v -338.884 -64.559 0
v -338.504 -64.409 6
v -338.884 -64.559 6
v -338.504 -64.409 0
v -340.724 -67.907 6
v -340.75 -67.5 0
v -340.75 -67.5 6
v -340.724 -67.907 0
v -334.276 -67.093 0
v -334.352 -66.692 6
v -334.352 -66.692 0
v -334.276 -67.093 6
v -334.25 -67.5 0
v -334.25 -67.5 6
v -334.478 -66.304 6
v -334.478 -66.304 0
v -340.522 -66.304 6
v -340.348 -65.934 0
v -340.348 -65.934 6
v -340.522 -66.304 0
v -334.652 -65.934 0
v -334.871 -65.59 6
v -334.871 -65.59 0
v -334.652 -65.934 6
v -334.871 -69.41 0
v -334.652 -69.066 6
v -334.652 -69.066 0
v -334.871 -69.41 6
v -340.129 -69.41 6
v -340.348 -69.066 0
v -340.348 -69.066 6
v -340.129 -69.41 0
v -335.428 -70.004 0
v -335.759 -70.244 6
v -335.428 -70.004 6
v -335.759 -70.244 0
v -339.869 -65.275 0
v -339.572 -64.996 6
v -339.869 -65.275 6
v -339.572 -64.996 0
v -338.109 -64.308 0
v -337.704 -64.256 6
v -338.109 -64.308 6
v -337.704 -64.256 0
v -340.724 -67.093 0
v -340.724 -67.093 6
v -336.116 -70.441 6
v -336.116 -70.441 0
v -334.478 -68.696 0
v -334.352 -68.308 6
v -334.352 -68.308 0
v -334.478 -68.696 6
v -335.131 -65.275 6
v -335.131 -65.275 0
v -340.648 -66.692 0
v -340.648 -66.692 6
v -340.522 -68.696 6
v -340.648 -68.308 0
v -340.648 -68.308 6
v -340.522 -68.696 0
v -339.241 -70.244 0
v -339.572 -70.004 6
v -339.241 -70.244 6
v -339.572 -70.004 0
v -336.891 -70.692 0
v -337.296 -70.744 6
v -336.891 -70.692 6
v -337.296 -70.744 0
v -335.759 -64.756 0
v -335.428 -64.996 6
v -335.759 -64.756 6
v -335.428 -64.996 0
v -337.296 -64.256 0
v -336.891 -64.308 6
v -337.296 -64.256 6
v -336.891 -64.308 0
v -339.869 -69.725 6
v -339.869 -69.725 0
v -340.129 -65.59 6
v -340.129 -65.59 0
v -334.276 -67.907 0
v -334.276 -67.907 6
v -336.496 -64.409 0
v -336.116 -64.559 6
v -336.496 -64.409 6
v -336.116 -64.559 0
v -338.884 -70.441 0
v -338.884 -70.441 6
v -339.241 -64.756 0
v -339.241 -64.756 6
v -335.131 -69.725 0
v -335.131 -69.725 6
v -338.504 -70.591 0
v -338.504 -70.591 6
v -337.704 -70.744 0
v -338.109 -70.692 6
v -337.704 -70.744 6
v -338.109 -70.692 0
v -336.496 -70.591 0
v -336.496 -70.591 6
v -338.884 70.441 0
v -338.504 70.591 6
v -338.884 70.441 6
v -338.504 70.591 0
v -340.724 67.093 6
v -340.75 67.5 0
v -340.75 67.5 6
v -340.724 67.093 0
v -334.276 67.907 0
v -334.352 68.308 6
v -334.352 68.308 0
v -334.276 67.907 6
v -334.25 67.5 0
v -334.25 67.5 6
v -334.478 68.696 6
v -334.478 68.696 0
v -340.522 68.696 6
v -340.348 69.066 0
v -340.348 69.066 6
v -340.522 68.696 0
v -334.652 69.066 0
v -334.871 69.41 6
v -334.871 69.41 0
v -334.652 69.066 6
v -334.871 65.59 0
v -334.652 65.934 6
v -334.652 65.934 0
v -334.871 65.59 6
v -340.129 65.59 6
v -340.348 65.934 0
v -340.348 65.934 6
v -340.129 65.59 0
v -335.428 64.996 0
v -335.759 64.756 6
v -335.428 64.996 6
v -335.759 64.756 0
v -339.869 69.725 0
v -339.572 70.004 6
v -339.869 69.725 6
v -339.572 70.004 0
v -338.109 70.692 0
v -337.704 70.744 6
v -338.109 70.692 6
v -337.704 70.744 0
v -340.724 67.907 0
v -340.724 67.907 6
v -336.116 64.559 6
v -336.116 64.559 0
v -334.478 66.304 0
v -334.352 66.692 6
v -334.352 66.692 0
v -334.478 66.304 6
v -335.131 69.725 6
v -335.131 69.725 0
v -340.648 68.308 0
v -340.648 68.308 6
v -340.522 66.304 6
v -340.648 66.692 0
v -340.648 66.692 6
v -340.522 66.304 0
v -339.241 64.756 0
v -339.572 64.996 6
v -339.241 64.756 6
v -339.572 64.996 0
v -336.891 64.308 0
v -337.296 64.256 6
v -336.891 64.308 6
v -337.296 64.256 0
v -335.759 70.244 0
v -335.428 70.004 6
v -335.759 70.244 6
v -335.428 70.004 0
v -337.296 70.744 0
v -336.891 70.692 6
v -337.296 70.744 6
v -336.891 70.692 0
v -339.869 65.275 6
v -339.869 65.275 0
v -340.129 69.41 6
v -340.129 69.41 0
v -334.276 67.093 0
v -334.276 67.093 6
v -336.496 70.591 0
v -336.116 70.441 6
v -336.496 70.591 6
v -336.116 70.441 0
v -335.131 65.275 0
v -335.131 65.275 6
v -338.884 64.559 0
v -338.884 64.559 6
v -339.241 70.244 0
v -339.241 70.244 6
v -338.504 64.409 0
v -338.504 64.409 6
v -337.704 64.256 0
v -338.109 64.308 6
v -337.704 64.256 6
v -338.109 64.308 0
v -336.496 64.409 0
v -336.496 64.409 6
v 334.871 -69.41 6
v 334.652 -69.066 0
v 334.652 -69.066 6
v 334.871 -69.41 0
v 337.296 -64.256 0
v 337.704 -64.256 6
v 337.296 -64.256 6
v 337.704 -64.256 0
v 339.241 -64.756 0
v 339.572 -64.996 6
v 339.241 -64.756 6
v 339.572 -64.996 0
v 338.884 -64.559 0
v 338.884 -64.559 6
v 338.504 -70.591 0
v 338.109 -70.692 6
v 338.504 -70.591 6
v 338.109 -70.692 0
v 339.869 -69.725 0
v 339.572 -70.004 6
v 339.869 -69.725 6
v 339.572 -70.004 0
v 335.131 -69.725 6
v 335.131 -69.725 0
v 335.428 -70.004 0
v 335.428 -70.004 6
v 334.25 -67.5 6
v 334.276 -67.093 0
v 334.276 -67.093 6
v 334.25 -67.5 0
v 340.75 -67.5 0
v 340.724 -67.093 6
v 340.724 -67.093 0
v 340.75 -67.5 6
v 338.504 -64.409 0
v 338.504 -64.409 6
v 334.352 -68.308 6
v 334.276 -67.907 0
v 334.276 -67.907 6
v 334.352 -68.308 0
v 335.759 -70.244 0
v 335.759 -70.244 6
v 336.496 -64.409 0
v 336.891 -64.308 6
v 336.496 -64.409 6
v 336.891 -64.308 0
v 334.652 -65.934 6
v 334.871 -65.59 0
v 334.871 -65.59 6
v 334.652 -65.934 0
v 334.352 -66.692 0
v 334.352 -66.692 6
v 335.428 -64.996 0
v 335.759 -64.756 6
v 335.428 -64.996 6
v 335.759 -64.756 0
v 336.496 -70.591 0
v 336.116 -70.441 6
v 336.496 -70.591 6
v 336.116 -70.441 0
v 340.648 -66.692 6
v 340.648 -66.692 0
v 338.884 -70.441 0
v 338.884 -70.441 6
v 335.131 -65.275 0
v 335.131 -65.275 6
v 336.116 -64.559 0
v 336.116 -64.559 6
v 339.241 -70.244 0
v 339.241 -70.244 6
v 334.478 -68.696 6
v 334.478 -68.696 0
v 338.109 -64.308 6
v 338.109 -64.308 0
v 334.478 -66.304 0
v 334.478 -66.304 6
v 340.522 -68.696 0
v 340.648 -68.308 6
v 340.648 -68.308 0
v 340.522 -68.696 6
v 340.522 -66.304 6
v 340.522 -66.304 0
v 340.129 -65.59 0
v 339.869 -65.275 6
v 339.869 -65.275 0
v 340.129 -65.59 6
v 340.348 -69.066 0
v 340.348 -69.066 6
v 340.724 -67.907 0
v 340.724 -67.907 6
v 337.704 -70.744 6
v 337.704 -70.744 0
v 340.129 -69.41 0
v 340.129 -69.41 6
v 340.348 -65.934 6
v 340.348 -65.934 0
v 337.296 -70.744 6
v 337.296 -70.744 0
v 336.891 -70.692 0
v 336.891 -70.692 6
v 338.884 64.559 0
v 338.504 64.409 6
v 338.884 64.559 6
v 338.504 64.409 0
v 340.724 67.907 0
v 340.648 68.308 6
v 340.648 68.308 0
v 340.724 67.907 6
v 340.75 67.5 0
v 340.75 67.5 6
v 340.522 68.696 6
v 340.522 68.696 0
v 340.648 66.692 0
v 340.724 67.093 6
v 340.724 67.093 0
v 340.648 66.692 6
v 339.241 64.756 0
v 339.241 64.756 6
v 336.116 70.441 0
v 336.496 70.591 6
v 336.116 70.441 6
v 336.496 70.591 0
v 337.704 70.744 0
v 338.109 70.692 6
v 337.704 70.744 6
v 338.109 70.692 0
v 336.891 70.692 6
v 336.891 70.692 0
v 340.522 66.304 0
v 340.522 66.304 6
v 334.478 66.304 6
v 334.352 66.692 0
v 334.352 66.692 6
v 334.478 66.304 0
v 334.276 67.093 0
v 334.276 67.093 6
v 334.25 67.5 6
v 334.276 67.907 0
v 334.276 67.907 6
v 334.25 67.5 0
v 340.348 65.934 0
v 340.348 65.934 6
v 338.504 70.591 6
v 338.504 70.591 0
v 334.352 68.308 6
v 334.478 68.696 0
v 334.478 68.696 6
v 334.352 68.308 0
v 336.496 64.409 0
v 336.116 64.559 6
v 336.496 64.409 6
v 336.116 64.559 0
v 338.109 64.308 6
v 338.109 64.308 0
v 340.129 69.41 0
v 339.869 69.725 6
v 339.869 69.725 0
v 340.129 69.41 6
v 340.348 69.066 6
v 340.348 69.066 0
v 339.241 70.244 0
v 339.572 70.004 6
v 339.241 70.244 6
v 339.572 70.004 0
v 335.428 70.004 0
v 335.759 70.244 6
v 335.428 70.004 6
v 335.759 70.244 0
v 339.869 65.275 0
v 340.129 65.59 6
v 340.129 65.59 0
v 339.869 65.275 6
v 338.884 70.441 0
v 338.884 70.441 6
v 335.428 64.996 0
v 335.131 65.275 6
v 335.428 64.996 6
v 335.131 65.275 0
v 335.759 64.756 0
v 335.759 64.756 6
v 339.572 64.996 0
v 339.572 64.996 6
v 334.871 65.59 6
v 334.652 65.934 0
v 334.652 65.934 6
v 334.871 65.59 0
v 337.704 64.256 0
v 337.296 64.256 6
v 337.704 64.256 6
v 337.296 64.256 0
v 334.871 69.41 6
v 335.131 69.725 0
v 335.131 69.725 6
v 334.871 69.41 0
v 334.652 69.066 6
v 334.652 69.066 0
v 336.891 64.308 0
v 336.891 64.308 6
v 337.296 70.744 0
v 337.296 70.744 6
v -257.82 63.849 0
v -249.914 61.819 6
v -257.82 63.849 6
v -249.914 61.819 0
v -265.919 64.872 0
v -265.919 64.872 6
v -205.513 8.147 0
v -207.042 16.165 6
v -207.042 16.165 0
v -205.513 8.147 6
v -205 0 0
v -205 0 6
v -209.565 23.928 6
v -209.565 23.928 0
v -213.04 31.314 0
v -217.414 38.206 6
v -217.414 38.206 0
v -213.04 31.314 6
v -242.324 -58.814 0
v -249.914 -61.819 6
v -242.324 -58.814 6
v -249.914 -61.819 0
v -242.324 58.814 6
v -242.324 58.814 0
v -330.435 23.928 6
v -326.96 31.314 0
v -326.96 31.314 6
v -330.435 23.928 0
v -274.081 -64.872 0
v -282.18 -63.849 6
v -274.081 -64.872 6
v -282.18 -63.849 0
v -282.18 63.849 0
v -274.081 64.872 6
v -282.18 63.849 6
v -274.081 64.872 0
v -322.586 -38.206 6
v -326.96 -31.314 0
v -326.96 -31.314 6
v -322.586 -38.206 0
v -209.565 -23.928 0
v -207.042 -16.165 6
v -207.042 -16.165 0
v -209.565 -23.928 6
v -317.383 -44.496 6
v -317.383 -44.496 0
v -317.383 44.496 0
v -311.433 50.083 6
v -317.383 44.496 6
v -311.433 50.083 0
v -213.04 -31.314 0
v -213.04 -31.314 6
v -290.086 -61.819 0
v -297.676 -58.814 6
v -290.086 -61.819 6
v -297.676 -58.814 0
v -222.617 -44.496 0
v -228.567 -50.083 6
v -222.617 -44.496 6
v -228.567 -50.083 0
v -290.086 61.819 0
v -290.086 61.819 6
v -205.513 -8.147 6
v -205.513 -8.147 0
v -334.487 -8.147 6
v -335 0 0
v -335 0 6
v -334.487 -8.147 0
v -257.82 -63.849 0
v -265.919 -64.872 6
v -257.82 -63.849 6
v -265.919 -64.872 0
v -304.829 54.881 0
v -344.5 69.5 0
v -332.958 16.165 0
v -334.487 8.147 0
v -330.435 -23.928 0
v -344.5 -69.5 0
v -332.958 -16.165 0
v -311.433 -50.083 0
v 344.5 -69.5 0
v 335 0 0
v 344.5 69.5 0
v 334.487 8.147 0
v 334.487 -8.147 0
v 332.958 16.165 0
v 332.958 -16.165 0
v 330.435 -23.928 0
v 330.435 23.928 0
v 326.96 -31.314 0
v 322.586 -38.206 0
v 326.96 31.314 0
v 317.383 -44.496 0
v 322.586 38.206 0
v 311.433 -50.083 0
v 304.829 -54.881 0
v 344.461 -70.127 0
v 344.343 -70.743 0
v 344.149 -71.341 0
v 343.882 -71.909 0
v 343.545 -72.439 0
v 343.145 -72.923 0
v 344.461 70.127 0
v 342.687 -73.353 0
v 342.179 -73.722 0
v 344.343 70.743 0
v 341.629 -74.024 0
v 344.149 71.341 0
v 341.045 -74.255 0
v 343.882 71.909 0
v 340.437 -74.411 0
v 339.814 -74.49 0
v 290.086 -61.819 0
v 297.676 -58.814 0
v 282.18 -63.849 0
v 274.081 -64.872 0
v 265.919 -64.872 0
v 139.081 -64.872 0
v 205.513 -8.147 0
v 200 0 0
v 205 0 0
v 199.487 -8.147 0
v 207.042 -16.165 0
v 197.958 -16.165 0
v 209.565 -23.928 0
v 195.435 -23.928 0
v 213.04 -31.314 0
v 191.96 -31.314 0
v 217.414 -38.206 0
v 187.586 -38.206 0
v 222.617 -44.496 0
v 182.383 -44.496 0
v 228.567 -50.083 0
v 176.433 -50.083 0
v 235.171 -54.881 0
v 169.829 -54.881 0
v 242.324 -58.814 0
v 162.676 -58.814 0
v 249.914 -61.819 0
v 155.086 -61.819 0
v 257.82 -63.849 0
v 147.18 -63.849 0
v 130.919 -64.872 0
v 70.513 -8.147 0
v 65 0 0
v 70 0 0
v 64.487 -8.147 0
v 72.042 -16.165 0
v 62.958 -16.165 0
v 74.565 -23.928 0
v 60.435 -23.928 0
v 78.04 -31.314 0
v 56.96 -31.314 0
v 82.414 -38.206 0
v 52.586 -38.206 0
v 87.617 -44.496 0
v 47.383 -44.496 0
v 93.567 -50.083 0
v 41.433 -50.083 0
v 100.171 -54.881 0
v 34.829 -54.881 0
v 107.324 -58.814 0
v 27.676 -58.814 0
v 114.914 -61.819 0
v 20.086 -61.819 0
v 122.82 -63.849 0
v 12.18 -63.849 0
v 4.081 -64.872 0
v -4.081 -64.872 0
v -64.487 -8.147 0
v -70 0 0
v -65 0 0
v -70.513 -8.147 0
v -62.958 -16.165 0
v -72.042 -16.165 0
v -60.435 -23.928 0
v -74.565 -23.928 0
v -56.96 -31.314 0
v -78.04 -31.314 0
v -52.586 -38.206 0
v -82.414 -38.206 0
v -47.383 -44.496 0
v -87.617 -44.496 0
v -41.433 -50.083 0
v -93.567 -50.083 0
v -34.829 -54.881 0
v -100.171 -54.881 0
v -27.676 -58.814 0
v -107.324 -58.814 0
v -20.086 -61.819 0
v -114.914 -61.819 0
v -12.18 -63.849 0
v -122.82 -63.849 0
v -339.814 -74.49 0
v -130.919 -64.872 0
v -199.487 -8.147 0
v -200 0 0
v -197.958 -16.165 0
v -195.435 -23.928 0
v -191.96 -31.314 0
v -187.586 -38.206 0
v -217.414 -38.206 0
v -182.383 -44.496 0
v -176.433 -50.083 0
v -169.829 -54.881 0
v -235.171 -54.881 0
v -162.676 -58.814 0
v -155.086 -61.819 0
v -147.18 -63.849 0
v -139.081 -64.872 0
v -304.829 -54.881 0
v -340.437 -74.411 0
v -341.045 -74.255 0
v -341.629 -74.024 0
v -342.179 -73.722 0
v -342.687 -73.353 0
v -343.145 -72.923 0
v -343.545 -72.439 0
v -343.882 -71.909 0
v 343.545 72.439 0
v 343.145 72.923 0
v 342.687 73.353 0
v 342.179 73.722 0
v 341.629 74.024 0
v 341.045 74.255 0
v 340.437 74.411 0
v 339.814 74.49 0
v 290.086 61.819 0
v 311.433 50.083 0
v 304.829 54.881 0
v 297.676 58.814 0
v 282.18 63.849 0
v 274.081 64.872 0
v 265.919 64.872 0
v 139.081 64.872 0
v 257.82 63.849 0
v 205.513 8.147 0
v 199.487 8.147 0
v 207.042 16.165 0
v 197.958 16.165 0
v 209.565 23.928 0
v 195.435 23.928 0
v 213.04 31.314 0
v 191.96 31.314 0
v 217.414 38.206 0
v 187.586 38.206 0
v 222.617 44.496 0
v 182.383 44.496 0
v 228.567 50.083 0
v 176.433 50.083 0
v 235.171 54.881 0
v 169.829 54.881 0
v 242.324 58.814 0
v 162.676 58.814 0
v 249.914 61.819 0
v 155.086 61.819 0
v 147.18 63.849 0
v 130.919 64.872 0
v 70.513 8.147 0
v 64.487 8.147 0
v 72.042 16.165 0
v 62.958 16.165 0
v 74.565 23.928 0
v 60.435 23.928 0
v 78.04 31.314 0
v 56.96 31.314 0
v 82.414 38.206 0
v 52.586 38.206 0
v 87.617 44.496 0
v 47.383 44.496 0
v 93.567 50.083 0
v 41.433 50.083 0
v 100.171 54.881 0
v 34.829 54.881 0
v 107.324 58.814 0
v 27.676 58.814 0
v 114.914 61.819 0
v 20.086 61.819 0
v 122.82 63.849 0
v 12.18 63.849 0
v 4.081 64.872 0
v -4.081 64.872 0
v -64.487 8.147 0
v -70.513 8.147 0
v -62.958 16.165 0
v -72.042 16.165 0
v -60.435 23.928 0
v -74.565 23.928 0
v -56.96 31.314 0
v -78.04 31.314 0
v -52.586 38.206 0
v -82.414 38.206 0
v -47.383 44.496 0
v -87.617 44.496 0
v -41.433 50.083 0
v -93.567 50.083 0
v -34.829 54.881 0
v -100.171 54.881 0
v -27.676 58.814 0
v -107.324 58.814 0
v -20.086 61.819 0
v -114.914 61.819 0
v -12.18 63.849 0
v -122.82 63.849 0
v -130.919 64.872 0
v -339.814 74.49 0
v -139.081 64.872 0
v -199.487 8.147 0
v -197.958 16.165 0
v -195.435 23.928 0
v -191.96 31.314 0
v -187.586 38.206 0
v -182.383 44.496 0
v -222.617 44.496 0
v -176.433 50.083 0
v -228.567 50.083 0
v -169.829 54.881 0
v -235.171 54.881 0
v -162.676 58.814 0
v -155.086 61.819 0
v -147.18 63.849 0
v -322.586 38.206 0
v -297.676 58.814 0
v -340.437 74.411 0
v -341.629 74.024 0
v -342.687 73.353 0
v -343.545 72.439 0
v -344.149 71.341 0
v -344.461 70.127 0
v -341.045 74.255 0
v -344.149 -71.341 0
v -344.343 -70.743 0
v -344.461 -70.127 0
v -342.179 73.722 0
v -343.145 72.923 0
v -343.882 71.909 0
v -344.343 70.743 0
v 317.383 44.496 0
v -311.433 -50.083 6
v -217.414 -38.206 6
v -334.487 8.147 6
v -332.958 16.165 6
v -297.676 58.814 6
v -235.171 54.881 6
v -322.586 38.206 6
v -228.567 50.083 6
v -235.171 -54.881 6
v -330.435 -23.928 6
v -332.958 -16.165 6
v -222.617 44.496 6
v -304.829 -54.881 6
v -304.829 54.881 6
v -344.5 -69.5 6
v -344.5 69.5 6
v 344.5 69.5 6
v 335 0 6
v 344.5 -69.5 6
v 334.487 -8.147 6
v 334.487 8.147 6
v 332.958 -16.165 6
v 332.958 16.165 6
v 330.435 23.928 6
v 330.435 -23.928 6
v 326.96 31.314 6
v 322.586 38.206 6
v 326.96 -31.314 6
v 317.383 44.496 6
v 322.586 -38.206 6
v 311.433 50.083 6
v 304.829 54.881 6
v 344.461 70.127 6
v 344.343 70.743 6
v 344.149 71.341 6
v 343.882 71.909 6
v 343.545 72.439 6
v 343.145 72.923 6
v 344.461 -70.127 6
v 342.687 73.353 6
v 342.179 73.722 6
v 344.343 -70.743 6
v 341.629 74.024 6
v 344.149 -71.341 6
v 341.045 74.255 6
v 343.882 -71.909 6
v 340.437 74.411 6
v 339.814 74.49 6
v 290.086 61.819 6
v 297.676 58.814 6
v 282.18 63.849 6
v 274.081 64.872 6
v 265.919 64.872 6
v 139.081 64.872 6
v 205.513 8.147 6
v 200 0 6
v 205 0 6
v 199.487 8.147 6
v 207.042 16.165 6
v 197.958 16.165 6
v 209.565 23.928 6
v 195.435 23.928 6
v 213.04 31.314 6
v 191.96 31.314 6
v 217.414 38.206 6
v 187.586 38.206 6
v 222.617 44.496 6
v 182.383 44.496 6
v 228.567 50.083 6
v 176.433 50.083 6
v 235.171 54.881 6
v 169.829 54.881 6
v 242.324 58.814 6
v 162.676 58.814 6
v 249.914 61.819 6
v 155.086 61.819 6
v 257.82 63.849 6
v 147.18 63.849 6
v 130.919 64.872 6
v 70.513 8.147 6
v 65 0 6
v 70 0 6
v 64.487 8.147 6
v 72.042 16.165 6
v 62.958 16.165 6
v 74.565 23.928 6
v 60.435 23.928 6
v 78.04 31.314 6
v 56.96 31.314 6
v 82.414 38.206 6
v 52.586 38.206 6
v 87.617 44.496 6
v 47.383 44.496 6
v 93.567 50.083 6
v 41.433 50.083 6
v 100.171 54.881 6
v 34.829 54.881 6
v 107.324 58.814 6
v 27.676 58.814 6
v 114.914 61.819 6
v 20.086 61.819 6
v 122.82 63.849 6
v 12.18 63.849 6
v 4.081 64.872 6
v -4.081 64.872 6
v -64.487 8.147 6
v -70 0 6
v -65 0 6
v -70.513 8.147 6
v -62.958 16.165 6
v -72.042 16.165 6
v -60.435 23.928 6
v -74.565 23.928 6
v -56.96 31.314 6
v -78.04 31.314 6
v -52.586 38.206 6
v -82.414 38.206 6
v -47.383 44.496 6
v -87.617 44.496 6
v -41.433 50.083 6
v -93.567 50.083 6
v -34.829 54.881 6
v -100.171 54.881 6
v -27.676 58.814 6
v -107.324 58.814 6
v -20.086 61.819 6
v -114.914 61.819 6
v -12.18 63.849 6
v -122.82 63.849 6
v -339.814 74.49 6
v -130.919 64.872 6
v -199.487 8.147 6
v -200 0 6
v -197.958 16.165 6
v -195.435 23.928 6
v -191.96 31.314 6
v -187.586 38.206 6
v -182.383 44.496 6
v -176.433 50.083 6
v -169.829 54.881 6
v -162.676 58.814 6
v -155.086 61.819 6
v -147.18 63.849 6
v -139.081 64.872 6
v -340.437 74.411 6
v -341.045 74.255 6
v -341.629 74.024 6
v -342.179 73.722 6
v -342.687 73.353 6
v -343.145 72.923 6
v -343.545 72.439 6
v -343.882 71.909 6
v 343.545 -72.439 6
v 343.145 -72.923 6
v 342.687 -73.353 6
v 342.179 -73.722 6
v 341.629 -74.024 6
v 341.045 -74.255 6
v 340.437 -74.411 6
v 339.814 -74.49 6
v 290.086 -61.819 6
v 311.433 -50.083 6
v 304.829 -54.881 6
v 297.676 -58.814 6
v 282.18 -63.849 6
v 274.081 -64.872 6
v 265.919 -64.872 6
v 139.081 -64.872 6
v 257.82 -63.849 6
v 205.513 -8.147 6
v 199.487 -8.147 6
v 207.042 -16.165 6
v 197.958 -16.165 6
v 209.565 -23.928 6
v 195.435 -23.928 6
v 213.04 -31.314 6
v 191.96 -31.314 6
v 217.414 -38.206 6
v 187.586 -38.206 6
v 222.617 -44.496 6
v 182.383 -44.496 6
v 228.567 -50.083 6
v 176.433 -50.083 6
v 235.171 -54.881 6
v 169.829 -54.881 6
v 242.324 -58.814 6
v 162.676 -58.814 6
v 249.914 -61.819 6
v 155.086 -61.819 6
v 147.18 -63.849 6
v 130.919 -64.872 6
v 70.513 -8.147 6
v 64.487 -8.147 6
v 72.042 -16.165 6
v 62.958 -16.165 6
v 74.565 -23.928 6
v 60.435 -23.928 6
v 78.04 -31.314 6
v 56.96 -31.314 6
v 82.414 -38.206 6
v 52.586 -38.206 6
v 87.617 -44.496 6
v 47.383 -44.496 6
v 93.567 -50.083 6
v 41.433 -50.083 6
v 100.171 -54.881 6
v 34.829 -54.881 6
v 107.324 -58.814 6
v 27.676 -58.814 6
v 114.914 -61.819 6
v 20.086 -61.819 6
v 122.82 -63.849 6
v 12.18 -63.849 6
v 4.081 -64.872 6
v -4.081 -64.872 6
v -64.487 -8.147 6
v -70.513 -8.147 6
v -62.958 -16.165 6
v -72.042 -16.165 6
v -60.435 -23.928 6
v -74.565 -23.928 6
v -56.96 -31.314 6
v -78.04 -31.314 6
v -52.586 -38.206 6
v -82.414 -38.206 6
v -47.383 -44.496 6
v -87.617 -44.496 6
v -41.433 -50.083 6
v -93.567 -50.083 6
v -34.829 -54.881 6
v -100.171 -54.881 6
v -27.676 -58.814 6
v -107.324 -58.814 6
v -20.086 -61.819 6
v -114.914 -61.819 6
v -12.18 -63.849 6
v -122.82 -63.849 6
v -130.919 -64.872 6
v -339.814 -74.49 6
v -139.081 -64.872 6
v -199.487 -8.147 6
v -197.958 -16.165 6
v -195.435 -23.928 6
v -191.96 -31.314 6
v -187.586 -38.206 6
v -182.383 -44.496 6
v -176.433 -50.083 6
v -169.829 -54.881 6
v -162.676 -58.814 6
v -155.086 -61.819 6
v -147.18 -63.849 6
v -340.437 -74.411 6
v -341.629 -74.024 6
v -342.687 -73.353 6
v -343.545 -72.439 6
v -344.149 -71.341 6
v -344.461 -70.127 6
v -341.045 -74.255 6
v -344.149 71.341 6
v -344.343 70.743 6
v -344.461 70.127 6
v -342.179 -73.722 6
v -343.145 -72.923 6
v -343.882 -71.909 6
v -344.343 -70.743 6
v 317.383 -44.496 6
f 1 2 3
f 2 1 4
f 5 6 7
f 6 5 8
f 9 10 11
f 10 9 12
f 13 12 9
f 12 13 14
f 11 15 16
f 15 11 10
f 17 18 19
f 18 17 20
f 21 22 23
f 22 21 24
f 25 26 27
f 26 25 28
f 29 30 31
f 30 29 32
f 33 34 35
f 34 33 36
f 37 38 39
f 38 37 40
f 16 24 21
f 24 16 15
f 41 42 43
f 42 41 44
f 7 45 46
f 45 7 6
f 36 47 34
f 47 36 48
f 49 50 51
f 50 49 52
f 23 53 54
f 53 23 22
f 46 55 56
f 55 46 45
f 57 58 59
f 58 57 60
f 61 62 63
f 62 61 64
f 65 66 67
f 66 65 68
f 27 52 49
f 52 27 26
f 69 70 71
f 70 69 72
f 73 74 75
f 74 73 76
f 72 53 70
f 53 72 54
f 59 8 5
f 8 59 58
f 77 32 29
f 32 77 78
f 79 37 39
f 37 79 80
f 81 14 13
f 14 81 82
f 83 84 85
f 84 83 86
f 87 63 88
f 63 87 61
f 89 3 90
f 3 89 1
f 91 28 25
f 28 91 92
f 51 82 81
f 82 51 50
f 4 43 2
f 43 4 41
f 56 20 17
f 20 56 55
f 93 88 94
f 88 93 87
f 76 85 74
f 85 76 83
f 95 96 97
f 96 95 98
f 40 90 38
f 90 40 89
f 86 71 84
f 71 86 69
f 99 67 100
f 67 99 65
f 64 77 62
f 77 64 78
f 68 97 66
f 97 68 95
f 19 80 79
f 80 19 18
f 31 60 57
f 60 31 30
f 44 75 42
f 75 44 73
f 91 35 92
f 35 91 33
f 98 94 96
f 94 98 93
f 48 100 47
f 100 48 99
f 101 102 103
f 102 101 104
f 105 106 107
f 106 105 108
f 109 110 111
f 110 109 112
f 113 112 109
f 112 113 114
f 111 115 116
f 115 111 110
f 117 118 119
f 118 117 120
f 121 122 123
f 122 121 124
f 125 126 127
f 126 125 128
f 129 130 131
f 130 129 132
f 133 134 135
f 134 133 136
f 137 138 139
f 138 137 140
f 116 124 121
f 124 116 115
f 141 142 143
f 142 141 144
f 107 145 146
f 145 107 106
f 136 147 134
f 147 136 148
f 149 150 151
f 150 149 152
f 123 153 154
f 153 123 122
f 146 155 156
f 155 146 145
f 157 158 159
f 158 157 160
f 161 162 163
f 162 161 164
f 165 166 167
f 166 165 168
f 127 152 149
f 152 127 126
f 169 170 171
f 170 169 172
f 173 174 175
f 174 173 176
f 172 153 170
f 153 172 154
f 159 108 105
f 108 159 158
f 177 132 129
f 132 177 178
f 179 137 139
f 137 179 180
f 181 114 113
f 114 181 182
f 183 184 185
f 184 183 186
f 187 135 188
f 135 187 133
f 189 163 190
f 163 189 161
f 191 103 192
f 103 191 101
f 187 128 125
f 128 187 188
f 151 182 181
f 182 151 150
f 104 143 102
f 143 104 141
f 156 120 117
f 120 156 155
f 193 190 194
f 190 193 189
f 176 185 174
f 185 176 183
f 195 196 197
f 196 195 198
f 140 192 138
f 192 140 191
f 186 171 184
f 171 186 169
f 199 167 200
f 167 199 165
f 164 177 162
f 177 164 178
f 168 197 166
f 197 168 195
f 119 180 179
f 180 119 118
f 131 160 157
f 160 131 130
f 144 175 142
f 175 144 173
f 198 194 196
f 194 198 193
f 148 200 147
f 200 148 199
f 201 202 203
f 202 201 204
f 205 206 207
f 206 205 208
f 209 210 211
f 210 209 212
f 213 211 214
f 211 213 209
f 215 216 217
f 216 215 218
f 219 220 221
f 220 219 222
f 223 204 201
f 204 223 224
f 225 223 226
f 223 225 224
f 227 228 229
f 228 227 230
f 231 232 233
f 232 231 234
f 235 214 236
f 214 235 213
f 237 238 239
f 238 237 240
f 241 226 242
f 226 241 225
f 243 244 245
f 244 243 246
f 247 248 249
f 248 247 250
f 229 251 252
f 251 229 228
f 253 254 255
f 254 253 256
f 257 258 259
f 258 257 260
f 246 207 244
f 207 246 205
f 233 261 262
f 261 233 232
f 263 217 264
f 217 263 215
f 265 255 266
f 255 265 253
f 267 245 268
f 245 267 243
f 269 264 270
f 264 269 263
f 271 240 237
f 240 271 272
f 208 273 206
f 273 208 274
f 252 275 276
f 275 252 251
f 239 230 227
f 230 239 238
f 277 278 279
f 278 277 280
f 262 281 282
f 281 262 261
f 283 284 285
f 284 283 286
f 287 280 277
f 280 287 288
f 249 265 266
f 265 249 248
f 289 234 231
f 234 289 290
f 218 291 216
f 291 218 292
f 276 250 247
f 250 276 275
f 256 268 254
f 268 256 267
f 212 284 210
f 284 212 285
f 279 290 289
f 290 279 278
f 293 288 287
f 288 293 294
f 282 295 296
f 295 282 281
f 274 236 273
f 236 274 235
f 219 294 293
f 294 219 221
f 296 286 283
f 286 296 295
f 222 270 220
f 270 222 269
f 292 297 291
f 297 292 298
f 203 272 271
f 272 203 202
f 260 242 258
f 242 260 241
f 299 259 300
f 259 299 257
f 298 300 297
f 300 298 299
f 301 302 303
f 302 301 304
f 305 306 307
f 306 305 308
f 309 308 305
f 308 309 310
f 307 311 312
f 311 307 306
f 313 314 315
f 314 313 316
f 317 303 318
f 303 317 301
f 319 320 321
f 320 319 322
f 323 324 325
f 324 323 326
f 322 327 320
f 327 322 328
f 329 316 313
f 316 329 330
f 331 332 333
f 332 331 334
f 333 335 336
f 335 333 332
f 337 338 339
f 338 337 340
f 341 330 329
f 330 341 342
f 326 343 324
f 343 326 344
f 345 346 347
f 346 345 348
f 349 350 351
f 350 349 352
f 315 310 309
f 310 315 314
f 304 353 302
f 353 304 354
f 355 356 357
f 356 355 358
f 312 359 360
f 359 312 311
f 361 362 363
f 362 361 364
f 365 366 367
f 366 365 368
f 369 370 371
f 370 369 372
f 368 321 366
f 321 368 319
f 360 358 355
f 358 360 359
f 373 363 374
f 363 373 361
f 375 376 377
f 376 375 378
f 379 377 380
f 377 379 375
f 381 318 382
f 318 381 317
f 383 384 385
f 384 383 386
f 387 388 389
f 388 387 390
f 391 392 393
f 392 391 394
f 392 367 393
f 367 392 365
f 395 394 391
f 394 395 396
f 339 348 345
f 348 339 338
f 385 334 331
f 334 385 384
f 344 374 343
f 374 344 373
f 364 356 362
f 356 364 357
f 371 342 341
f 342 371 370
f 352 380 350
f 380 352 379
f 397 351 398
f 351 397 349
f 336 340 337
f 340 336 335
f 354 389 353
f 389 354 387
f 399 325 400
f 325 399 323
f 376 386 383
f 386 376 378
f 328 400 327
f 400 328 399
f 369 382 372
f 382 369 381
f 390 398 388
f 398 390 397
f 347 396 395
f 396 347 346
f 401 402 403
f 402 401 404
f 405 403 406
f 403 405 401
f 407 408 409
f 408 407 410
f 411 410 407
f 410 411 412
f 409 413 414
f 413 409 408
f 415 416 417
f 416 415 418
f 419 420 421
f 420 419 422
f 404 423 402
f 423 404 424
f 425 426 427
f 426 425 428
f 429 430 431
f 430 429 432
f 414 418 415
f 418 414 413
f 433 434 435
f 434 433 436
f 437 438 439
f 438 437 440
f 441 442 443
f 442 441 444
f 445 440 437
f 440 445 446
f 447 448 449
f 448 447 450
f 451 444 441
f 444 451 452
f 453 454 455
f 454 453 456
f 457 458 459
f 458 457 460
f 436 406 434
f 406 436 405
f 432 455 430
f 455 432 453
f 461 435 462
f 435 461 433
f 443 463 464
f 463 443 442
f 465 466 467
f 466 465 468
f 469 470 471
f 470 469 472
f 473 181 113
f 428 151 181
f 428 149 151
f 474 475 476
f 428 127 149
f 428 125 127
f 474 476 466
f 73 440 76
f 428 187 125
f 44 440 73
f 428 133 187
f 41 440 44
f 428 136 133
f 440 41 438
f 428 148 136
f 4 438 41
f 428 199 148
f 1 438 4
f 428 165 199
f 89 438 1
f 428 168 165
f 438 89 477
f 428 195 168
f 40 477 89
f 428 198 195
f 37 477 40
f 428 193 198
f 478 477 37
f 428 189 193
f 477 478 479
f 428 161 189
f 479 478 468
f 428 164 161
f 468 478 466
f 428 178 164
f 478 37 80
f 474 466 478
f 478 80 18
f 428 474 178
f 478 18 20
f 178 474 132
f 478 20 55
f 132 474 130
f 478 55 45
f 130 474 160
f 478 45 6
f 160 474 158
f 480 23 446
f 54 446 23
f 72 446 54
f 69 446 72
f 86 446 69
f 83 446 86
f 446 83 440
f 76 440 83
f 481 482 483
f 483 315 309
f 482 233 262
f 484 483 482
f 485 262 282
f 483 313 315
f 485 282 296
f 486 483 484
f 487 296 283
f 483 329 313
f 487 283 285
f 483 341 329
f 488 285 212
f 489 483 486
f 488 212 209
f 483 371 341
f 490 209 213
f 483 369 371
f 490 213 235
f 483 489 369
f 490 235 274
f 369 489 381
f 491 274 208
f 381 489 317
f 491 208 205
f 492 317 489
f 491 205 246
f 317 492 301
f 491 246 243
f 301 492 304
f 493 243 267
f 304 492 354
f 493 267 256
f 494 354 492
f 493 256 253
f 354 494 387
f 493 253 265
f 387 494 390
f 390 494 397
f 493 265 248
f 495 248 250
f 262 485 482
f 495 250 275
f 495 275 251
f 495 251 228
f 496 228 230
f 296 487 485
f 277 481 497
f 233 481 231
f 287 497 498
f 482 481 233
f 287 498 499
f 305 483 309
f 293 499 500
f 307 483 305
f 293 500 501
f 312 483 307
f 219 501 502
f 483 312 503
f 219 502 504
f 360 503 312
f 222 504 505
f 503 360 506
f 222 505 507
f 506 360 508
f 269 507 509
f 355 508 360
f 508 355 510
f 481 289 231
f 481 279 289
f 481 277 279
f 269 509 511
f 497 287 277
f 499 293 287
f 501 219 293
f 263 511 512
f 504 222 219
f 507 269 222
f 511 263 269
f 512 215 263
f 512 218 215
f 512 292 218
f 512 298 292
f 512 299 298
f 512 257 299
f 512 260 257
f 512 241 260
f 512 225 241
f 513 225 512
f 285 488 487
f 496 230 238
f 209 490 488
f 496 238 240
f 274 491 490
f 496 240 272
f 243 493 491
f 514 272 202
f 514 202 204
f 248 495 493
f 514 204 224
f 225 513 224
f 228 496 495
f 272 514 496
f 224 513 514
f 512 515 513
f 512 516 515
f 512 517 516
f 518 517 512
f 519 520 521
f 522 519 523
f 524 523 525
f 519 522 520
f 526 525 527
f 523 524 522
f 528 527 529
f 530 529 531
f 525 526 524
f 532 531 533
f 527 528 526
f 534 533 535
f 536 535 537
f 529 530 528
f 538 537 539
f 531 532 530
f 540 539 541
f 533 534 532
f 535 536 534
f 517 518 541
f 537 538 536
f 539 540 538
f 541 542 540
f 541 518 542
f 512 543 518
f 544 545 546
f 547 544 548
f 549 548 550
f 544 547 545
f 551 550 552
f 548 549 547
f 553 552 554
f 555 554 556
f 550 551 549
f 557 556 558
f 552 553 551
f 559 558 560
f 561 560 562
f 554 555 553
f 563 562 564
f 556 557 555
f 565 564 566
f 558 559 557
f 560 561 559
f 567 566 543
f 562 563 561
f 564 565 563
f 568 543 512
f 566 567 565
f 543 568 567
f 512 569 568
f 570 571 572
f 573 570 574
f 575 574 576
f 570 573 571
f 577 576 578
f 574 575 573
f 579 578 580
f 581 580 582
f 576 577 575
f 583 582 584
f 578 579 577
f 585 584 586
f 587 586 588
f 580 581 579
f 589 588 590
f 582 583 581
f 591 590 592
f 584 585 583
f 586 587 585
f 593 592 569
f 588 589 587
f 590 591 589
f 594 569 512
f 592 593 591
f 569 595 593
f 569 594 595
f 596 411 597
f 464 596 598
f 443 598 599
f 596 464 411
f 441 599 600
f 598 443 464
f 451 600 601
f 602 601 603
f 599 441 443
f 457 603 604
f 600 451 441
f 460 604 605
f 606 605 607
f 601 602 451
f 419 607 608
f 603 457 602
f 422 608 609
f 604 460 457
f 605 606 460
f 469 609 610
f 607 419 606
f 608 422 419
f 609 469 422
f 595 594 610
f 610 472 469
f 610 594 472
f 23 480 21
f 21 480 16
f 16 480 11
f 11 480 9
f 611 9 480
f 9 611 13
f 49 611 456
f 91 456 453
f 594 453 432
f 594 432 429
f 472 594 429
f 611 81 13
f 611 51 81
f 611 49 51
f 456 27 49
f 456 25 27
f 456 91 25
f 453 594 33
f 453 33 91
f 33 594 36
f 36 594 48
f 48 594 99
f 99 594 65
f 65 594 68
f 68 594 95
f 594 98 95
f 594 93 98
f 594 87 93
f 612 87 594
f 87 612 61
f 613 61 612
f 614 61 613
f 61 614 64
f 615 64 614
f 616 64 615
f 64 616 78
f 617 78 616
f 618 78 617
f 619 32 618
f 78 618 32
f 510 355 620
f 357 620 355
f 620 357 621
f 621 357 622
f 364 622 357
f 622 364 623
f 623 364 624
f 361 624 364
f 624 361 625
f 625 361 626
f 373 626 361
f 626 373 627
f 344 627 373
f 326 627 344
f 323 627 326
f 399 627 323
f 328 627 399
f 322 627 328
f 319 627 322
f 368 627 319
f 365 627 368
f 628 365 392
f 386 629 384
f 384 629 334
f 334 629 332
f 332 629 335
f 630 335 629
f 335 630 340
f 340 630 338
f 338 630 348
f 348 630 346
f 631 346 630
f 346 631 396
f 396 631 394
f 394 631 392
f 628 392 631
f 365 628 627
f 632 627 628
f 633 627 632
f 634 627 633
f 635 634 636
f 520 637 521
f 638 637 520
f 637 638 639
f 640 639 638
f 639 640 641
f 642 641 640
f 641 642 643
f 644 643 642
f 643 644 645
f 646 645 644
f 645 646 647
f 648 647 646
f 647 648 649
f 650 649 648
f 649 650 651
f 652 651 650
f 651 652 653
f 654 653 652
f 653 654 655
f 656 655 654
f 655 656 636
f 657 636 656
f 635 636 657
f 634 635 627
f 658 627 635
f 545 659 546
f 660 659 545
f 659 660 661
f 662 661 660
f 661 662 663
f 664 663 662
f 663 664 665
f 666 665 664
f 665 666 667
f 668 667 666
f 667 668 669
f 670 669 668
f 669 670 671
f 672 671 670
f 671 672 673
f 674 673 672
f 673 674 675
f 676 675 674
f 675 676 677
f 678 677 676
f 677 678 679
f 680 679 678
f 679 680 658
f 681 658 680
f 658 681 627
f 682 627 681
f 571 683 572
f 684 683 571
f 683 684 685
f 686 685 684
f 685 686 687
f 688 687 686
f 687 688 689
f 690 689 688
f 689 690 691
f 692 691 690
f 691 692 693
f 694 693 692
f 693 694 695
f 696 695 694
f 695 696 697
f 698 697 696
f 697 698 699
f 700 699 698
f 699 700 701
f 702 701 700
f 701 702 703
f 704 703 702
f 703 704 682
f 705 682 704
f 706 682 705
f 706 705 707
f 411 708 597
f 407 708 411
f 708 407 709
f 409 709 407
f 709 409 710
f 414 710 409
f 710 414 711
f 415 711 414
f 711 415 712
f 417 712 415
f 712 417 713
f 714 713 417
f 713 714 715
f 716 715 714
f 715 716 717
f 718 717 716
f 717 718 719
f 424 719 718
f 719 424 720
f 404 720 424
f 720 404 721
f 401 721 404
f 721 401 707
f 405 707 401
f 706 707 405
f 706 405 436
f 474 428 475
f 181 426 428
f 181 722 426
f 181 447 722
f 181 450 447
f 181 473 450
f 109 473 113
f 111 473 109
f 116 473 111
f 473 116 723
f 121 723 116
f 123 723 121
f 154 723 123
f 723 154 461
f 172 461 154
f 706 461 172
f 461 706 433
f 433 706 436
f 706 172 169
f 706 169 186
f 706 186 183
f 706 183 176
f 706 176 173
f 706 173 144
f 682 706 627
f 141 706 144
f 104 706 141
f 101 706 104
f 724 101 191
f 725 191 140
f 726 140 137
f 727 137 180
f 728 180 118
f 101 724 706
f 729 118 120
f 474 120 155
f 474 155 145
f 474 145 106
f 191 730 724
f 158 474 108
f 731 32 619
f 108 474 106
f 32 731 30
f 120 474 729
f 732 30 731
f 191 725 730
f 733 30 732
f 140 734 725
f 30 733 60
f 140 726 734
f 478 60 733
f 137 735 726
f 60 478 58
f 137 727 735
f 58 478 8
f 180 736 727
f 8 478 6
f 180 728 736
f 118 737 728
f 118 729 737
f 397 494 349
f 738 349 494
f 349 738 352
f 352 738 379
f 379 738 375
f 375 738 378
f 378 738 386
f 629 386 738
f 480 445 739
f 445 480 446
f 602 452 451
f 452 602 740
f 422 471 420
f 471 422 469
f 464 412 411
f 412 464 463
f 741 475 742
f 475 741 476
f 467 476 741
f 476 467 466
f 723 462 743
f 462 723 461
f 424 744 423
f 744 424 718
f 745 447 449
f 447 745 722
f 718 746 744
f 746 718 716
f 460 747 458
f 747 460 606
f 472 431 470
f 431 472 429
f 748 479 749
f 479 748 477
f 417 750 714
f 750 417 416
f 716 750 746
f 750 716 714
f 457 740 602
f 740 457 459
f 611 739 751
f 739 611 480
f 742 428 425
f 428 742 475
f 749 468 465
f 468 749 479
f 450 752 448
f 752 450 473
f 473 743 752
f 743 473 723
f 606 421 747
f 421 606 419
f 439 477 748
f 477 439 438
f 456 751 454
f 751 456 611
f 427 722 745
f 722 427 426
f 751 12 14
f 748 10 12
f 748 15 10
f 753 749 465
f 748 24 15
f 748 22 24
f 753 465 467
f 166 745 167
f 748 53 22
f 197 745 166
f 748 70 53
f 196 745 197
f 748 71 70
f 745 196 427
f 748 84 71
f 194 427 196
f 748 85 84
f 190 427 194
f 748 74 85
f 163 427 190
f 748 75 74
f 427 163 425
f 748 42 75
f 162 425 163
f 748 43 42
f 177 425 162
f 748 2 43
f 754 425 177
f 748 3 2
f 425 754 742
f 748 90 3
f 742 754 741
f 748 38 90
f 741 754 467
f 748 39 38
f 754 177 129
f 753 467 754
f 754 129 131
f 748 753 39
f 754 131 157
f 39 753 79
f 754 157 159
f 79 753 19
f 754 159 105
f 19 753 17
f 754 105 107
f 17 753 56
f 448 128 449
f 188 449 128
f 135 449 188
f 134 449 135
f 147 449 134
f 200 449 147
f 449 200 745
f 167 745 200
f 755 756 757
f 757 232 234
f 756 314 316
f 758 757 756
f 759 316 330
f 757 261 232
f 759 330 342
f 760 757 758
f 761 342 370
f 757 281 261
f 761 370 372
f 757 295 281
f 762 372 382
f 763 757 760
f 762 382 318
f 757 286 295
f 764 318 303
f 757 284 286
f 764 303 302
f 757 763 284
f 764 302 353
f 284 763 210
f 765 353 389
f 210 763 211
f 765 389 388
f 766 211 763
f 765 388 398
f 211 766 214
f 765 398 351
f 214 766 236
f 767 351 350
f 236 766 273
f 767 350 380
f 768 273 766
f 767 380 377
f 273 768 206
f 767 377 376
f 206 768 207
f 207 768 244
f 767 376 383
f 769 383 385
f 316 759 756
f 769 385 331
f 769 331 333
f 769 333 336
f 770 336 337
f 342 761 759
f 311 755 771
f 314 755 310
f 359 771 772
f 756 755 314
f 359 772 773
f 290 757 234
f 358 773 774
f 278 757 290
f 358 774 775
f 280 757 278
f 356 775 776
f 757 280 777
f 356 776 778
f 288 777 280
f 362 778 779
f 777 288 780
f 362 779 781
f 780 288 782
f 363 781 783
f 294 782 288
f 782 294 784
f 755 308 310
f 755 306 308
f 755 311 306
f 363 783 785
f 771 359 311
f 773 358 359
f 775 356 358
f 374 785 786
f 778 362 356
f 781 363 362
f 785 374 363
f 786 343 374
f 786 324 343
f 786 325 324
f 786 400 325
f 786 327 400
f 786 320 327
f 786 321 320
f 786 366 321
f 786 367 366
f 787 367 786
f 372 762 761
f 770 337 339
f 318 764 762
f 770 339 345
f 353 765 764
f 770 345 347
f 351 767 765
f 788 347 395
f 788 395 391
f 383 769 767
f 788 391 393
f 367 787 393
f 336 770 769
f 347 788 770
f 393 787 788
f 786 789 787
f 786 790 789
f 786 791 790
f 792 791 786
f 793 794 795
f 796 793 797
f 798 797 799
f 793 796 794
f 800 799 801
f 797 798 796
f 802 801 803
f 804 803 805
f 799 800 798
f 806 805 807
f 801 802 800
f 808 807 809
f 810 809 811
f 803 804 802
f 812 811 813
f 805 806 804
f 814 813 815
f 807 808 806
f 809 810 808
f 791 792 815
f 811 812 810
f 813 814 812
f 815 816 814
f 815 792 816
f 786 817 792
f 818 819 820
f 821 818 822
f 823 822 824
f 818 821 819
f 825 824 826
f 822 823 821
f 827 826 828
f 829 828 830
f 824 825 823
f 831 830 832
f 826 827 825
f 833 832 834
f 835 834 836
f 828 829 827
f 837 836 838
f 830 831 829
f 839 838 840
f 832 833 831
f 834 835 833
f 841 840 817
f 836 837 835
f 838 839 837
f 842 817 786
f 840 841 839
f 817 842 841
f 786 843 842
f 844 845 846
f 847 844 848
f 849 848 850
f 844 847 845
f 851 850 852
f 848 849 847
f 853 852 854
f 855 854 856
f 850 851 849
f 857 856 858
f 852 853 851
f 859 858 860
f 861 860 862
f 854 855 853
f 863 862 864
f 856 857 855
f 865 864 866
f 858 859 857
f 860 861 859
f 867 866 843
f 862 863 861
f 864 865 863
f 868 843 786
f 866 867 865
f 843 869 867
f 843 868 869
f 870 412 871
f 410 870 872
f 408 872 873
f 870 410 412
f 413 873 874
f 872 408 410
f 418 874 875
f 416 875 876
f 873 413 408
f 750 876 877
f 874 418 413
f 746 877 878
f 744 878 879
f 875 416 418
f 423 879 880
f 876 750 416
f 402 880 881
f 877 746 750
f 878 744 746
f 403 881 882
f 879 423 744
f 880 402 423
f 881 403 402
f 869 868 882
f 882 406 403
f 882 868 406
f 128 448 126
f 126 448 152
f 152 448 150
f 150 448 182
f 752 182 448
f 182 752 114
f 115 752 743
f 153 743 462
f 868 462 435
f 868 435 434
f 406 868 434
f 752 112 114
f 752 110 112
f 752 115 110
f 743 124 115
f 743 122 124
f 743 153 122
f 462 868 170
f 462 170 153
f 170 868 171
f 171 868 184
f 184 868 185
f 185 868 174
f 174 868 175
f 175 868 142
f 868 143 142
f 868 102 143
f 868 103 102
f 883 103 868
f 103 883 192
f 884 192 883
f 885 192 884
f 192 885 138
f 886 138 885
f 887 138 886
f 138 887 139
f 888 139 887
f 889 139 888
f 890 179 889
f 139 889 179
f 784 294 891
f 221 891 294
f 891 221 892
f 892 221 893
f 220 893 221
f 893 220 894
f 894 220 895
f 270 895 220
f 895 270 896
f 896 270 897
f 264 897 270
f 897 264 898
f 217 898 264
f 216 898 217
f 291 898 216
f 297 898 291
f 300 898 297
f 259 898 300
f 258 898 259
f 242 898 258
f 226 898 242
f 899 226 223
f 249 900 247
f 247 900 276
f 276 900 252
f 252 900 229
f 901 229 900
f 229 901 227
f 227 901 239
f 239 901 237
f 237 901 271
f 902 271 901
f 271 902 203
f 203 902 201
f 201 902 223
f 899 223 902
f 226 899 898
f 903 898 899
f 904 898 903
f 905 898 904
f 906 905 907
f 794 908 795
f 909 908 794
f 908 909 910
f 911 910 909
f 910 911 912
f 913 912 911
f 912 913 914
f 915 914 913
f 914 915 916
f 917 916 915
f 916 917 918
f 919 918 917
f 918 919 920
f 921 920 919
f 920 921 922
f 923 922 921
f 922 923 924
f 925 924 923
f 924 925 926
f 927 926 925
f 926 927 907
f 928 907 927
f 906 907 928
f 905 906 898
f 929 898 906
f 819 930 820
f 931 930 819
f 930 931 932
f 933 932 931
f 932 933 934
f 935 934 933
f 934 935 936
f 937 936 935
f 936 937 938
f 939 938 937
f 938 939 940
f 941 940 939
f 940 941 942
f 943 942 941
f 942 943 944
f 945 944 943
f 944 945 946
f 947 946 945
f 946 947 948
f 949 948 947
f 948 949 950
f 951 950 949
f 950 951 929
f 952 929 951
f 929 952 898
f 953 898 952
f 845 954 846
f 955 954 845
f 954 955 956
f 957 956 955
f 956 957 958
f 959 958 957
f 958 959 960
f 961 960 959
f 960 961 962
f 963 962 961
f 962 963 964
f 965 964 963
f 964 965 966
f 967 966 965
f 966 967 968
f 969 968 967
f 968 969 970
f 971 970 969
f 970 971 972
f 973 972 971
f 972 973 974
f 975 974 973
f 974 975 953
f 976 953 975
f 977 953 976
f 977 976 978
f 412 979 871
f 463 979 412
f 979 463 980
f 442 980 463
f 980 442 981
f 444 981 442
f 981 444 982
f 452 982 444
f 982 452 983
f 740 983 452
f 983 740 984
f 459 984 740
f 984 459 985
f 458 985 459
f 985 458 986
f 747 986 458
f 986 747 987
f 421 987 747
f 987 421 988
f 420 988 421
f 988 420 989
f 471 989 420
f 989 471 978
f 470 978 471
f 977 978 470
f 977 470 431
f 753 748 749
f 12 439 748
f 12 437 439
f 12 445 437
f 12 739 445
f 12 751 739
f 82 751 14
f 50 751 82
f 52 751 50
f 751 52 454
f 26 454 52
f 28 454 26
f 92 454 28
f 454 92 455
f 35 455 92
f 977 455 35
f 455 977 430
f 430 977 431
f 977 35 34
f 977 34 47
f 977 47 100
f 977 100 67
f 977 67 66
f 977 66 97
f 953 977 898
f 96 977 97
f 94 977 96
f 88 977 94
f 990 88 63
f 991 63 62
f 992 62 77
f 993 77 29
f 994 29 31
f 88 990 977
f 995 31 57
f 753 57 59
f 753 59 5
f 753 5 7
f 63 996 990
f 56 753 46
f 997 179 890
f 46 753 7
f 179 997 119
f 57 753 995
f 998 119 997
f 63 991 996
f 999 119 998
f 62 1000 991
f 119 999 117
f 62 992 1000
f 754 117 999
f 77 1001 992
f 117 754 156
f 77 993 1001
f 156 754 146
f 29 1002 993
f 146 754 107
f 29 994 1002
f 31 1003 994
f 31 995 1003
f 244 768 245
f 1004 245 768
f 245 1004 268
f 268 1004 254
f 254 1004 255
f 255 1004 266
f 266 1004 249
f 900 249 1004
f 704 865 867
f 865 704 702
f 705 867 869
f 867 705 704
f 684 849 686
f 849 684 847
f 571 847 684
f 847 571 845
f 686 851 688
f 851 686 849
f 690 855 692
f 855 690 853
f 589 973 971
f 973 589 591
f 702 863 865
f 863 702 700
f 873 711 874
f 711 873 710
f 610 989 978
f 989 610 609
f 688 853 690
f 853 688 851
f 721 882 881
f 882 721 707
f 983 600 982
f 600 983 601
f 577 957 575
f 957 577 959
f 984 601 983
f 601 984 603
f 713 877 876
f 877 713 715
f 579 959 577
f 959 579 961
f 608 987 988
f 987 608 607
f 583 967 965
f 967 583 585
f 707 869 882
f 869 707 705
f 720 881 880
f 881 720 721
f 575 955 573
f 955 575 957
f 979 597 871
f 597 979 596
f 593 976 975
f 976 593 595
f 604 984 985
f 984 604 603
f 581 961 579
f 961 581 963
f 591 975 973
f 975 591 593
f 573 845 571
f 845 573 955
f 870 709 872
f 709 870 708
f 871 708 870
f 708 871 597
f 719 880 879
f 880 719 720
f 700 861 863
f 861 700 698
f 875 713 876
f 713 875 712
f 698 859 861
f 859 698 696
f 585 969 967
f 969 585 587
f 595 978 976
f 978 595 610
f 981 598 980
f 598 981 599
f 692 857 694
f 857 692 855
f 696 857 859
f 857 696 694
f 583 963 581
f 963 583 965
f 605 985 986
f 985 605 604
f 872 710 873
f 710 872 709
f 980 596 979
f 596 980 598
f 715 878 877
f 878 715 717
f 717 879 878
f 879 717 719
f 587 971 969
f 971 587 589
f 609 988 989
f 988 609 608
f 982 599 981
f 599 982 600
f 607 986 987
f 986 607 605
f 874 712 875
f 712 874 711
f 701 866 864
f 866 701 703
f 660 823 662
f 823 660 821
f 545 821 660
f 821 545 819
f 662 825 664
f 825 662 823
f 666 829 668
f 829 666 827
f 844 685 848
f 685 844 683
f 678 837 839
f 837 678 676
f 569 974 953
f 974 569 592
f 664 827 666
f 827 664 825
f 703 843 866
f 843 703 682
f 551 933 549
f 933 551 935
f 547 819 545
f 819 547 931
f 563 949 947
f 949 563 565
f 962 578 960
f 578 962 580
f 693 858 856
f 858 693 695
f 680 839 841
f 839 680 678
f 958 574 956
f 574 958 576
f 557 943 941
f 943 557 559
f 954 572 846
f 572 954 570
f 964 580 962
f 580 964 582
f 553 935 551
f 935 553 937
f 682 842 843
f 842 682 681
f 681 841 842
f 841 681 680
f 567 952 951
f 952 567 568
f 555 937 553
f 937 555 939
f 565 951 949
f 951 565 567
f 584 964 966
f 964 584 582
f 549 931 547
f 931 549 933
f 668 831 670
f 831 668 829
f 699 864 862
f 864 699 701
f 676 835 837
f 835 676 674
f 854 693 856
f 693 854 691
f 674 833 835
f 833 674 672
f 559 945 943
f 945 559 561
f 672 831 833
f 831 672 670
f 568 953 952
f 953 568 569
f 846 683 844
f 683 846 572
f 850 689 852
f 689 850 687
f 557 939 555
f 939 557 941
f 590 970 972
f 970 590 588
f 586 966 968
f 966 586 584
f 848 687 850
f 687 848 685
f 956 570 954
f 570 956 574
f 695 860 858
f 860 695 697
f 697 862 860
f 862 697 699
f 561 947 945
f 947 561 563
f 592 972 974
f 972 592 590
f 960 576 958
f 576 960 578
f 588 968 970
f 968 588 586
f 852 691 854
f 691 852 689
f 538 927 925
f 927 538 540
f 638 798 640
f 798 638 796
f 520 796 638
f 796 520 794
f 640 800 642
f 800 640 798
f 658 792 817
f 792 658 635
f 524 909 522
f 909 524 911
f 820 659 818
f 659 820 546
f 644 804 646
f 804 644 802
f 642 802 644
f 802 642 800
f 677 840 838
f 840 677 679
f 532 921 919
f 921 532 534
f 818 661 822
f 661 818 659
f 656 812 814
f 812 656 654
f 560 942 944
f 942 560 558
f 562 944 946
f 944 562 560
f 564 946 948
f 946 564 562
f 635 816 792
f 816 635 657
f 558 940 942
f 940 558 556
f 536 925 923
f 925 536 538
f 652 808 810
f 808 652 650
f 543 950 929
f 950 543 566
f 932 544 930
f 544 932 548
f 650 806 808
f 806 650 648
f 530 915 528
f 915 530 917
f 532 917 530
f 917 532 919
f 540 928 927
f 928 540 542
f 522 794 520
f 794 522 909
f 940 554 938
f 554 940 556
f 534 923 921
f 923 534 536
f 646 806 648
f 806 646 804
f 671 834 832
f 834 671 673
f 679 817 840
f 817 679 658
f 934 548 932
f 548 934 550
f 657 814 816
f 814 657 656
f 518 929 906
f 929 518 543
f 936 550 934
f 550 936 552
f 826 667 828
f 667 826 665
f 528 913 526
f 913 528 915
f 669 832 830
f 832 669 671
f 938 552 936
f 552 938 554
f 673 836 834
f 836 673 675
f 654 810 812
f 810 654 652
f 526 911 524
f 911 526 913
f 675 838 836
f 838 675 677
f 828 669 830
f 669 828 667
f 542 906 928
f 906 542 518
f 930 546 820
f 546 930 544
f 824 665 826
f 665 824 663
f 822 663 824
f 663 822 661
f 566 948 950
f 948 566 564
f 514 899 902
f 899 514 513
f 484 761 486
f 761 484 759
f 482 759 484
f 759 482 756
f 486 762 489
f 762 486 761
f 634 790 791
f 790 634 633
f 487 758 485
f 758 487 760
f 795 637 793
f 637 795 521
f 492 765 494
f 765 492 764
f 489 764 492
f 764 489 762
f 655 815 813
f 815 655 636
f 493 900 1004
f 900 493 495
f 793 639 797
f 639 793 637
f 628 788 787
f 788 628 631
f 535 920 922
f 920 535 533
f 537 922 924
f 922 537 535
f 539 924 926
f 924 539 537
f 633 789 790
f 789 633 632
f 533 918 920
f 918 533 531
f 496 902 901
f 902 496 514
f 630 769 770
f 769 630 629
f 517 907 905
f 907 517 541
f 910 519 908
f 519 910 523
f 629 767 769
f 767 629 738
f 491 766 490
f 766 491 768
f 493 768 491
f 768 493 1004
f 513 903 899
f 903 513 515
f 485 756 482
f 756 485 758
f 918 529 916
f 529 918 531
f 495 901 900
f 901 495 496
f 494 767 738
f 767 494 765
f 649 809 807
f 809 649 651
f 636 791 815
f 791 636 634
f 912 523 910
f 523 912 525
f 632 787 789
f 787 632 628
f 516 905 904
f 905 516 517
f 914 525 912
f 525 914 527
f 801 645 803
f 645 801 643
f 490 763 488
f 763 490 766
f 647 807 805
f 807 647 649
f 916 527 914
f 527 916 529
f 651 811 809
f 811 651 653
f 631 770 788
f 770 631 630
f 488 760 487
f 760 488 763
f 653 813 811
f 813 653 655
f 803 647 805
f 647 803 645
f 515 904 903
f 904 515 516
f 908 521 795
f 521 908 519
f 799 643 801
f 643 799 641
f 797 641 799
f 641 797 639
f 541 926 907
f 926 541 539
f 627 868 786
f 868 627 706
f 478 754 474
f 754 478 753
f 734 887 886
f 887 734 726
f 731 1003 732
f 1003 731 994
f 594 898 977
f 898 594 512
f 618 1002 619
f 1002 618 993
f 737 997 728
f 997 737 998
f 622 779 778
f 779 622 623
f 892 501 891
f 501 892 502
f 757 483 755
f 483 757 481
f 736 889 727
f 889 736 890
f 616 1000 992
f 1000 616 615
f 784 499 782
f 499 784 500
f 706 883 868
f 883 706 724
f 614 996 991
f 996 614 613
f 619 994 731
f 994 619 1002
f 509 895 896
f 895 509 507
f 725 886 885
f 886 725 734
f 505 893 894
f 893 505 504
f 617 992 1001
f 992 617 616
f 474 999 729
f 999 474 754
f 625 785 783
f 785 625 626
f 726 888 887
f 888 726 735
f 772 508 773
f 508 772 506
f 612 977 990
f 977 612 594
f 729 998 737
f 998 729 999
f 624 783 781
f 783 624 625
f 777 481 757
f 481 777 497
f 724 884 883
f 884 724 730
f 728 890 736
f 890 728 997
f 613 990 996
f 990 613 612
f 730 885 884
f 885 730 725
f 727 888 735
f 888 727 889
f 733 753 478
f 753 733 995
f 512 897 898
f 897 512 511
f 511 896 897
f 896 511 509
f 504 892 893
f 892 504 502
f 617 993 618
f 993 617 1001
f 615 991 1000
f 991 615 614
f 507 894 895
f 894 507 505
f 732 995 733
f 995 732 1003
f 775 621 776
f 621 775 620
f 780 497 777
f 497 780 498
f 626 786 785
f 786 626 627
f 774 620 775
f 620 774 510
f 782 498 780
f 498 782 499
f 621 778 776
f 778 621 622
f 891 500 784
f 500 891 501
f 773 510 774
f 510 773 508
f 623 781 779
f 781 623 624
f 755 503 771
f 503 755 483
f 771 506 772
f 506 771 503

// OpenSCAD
$fn = 50;


difference() {
	union() {
		hull() {
			translate(v = [-339.5000000000, 69.5000000000, 0]) {
				cylinder(h = 6, r = 5);
			}
			translate(v = [339.5000000000, 69.5000000000, 0]) {
				cylinder(h = 6, r = 5);
			}
			translate(v = [-339.5000000000, -69.5000000000, 0]) {
				cylinder(h = 6, r = 5);
			}
			translate(v = [339.5000000000, -69.5000000000, 0]) {
				cylinder(h = 6, r = 5);
			}
		}
	}
	union() {
		#translate(v = [-337.5000000000, -67.5000000000, -100.0000000000]) {
			cylinder(h = 200, r = 3.2500000000);
		}
		#translate(v = [-337.5000000000, 67.5000000000, -100.0000000000]) {
			cylinder(h = 200, r = 3.2500000000);
		}
		#translate(v = [337.5000000000, -67.5000000000, -100.0000000000]) {
			cylinder(h = 200, r = 3.2500000000);
		}
		#translate(v = [337.5000000000, 67.5000000000, -100.0000000000]) {
			cylinder(h = 200, r = 3.2500000000);
		}
		#translate(v = [-270.0000000000, 0, 0]) {
			cylinder(h = 6, r = 65.0000000000);
		}
		#translate(v = [-135.0000000000, 0, 0]) {
			cylinder(h = 6, r = 65.0000000000);
		}
		#cylinder(h = 6, r = 65.0000000000);
		#translate(v = [135.0000000000, 0, 0]) {
			cylinder(h = 6, r = 65.0000000000);
		}
		#translate(v = [270.0000000000, 0, 0]) {
			cylinder(h = 6, r = 65.0000000000);
		}
	}
}
